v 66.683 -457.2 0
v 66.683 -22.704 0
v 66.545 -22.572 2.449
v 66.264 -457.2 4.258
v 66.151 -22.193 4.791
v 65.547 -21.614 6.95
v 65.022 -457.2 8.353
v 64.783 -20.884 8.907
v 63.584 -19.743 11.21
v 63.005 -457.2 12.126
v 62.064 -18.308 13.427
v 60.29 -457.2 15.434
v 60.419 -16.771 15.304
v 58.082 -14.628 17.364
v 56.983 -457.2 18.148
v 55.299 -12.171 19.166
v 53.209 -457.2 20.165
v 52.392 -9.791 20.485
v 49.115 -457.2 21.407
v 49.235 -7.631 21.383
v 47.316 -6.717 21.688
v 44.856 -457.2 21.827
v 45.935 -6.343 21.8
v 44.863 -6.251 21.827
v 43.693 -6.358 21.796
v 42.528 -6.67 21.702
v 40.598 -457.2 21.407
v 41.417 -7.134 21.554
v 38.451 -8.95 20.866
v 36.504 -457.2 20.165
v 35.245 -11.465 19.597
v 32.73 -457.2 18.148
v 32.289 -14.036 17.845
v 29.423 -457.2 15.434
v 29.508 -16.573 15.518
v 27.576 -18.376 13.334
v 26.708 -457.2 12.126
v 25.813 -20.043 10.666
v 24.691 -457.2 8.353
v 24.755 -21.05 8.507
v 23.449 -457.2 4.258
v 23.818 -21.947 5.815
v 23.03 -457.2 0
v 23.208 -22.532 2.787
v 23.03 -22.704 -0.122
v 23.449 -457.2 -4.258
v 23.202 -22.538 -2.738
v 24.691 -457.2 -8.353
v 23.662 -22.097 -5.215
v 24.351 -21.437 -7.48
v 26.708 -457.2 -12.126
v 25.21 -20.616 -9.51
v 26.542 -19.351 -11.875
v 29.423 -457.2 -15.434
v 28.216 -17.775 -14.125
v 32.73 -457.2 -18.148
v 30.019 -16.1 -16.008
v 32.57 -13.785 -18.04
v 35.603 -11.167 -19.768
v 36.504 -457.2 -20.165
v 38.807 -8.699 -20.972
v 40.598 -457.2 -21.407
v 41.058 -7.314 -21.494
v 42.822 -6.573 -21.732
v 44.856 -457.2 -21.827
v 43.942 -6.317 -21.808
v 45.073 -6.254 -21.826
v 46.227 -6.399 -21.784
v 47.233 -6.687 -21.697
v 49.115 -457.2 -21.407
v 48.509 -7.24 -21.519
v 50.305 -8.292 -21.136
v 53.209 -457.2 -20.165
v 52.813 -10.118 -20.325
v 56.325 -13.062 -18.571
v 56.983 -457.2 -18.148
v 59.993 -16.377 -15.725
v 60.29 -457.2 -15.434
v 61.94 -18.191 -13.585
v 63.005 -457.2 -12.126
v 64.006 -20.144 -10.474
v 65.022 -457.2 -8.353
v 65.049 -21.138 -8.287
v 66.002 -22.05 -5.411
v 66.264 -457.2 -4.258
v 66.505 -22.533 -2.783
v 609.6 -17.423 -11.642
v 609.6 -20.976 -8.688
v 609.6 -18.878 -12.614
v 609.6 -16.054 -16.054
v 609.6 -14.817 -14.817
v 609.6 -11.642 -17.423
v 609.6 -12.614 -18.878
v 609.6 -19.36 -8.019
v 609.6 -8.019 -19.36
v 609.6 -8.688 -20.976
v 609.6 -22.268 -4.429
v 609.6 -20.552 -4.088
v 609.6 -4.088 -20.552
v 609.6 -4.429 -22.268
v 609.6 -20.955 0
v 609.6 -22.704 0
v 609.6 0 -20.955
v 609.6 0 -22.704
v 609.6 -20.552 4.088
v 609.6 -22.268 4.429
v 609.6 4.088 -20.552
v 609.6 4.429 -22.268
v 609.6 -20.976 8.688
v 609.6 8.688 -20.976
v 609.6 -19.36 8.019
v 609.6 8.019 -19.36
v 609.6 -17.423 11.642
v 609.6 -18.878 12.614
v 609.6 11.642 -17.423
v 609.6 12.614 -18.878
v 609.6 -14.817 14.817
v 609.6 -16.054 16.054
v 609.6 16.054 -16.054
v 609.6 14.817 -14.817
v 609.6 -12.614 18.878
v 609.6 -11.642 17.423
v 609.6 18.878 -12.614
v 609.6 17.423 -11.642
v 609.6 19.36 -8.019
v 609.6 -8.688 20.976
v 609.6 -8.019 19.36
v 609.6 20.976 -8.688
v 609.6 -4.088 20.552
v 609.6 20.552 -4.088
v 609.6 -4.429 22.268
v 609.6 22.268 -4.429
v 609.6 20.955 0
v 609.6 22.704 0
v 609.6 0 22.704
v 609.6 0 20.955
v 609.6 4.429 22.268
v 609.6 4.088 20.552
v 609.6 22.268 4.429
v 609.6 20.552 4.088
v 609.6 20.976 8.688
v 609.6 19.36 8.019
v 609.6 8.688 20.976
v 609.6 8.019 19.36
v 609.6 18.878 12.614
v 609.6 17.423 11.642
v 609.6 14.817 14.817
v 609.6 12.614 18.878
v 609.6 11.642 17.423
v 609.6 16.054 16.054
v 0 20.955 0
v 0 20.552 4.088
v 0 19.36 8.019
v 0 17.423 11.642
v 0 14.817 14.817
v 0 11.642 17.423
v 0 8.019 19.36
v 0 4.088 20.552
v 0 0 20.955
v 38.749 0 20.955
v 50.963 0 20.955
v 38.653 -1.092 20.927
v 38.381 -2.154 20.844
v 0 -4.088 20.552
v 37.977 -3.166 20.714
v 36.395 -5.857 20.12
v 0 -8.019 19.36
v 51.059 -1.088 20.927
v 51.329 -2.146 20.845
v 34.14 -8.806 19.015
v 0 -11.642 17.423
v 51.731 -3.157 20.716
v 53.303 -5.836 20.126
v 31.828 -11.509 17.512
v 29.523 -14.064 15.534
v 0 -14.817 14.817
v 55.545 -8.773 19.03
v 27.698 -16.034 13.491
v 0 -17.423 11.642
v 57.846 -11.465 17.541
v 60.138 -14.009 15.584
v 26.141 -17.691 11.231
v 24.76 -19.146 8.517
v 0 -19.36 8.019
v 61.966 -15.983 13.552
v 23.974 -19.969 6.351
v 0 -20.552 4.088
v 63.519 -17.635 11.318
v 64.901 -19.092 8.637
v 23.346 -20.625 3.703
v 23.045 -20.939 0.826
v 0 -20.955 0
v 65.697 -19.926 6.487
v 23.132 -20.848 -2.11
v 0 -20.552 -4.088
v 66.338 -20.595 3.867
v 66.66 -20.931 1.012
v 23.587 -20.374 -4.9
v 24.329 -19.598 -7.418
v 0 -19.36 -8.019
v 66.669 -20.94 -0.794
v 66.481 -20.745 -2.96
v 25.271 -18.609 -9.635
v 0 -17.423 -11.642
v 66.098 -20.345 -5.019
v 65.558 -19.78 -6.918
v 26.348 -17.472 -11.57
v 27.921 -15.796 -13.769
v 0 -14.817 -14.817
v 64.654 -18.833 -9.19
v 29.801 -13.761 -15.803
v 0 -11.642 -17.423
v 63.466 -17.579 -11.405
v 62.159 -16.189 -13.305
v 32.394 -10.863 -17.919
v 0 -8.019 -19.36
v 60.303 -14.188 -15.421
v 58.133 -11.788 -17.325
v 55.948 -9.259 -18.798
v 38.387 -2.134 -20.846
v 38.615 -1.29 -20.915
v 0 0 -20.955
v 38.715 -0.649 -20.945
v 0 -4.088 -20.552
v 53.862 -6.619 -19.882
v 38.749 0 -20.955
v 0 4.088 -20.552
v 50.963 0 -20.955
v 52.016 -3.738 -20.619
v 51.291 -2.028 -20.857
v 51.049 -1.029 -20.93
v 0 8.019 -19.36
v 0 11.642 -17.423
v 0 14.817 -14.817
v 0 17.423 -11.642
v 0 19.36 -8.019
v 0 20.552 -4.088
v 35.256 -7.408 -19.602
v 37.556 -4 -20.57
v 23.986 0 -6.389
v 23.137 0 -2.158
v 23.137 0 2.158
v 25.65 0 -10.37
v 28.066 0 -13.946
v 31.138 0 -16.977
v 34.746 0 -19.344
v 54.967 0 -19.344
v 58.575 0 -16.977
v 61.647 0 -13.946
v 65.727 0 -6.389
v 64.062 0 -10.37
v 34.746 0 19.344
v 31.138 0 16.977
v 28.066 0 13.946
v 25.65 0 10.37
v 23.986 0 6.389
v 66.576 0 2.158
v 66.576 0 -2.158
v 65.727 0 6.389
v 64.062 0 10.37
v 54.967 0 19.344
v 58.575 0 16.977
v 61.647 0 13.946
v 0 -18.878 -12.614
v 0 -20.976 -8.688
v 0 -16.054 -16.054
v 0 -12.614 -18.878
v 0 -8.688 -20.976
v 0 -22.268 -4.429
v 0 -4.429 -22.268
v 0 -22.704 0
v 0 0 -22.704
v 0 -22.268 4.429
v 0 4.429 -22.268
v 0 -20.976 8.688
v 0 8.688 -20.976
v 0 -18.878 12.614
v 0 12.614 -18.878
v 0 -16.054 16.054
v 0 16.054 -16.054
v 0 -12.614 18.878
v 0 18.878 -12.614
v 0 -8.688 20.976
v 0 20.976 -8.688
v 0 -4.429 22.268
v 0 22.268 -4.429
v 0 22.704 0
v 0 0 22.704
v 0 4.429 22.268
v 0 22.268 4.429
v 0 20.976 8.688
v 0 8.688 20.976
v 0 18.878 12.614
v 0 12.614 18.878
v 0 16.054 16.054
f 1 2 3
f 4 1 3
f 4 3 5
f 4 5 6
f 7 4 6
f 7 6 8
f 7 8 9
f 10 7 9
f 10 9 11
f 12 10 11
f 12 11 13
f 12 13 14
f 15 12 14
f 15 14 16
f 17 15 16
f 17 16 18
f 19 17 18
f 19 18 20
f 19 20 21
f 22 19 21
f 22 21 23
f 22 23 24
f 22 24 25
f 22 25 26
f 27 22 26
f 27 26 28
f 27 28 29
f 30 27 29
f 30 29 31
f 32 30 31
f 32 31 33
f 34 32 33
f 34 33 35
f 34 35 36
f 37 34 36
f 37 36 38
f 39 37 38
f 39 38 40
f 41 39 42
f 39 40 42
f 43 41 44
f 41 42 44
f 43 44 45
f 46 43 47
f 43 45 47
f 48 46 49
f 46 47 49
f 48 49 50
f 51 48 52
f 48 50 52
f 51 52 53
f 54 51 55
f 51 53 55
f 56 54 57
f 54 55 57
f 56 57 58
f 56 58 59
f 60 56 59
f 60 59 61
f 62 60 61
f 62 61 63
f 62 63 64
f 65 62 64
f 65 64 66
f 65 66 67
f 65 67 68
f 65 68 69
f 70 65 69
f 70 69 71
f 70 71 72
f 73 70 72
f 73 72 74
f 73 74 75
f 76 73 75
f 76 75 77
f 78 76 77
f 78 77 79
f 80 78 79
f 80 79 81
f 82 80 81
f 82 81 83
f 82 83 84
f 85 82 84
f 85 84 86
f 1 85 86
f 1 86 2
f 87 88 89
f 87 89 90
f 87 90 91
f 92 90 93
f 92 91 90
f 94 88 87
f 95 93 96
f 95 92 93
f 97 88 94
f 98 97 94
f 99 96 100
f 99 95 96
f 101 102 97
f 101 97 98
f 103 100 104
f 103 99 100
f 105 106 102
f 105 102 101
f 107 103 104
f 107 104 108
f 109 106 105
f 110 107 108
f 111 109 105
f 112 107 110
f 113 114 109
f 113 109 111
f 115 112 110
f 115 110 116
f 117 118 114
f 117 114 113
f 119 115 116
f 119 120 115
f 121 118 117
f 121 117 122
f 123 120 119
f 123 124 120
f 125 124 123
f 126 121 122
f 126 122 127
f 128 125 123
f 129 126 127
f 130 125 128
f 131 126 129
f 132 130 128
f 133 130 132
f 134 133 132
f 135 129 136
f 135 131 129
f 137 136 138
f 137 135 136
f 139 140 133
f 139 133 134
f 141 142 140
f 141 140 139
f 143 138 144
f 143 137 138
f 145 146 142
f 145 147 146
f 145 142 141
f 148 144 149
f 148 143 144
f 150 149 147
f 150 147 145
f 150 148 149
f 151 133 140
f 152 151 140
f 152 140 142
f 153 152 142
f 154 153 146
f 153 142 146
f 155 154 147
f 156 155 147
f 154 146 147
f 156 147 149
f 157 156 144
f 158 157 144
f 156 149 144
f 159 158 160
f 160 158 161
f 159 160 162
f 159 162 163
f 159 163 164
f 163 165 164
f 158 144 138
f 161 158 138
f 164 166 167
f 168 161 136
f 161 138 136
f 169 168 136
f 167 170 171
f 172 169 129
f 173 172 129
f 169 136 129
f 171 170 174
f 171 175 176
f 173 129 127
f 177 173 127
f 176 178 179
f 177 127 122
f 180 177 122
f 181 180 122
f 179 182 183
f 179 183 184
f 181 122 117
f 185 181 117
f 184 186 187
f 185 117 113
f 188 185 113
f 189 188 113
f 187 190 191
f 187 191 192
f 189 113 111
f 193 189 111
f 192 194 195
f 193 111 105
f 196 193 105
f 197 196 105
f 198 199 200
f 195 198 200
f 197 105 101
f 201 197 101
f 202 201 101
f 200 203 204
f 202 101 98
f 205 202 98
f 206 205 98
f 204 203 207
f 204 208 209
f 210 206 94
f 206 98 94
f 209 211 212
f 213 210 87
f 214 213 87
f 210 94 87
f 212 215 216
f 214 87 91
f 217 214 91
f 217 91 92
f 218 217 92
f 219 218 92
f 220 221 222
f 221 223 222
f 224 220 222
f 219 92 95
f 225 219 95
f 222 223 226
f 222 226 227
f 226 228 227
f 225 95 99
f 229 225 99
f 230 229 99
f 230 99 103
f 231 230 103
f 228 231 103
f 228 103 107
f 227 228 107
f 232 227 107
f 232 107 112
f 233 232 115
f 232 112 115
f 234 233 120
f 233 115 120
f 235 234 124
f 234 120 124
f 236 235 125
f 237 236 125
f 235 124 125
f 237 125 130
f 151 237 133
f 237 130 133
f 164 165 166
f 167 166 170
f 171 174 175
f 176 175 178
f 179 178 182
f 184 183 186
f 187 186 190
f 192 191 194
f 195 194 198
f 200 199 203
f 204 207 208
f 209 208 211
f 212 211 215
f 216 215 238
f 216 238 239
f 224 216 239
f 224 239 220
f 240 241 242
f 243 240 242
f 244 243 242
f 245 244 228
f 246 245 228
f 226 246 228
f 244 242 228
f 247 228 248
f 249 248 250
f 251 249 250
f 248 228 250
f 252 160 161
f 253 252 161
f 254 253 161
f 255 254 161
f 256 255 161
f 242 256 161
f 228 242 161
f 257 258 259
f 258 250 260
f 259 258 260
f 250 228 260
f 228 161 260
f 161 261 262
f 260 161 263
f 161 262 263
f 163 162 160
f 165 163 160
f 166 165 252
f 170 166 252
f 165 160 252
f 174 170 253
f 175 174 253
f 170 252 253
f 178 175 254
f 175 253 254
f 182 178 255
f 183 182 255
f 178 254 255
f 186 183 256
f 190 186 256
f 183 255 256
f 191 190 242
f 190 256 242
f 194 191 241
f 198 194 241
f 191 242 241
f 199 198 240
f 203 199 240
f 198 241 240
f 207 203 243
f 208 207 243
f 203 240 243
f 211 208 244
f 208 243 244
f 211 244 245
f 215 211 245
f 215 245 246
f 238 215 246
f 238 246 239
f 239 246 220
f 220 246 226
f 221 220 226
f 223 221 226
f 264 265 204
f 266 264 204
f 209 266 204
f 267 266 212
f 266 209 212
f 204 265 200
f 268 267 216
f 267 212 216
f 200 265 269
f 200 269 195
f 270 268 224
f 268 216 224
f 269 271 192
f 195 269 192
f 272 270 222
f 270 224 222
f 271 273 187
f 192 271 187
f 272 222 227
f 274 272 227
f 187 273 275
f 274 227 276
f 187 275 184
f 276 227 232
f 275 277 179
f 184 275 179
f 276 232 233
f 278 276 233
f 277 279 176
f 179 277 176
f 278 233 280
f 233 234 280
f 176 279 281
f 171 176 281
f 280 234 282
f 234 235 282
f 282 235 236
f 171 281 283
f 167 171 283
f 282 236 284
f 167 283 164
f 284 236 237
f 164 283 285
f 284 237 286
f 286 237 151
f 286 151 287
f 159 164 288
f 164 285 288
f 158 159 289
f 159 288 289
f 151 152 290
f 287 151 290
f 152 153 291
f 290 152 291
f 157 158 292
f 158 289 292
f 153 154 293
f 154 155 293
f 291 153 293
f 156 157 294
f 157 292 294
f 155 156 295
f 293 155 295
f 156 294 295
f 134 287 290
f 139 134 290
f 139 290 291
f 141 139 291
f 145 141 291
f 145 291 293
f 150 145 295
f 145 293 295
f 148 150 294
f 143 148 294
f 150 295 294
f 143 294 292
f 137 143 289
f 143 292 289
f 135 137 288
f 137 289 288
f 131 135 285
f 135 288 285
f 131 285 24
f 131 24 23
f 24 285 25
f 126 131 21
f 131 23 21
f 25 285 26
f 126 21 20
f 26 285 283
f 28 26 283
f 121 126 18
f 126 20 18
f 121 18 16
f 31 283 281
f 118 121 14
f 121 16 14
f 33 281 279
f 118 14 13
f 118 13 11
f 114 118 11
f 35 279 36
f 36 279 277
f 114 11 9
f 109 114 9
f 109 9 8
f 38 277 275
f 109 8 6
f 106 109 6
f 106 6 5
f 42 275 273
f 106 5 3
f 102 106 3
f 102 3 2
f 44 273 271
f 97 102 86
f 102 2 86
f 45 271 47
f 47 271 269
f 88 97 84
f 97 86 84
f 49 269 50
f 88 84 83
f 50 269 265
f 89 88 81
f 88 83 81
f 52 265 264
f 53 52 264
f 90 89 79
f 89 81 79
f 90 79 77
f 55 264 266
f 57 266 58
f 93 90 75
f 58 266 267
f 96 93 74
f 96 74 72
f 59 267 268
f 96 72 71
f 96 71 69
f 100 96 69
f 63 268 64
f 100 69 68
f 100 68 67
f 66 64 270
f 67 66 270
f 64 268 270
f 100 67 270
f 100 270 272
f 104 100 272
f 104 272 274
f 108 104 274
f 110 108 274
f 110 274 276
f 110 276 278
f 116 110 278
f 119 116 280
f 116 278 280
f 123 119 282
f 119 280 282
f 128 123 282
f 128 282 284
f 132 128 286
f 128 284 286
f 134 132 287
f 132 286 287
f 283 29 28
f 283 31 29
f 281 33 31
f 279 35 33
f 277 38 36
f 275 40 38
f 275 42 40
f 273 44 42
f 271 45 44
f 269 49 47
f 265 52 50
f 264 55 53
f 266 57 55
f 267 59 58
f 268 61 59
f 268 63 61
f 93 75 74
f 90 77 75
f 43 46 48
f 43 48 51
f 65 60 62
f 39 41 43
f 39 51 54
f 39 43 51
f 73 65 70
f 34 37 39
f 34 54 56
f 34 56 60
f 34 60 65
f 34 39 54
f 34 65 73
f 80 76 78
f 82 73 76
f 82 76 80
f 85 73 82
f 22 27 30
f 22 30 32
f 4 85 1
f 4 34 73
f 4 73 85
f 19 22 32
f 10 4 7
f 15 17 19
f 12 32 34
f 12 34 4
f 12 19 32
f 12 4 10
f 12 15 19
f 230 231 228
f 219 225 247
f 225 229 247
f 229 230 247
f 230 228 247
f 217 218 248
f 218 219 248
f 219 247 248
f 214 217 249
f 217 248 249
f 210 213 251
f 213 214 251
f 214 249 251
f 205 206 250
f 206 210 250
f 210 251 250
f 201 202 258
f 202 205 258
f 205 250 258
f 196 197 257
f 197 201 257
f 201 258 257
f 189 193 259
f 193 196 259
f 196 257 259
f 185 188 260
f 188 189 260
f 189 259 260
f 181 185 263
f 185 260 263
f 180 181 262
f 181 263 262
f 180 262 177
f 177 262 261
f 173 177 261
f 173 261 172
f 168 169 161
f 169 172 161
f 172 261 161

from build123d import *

# Parameters (mm, degrees)
F0_R     = 22.704104
F1_DEPTH = 609.6
F3_D     = 41.91
F4_R     = 21.826729
F5_DEPTH = 457.2


with BuildPart() as f1:
    # F0 (on Right) → F1 (new body)
    with BuildSketch(Plane.YZ):
        Circle(F0_R)
    extrude(amount=F1_DEPTH)

    # F3 (through all)
    with Locations(Plane(origin=(0, 0, 0), x_dir=(0, -1, 0), z_dir=(-1, 0, 0))):
        with Locations((0, 0)):
            Hole(F3_D / 2)

    # F4 (on Front) → F5 (join)
    with BuildSketch(Plane.XZ):
        with Locations((44.85634, 0)):
            Circle(F4_R)
    extrude(amount=F5_DEPTH)


solid = f1.part
